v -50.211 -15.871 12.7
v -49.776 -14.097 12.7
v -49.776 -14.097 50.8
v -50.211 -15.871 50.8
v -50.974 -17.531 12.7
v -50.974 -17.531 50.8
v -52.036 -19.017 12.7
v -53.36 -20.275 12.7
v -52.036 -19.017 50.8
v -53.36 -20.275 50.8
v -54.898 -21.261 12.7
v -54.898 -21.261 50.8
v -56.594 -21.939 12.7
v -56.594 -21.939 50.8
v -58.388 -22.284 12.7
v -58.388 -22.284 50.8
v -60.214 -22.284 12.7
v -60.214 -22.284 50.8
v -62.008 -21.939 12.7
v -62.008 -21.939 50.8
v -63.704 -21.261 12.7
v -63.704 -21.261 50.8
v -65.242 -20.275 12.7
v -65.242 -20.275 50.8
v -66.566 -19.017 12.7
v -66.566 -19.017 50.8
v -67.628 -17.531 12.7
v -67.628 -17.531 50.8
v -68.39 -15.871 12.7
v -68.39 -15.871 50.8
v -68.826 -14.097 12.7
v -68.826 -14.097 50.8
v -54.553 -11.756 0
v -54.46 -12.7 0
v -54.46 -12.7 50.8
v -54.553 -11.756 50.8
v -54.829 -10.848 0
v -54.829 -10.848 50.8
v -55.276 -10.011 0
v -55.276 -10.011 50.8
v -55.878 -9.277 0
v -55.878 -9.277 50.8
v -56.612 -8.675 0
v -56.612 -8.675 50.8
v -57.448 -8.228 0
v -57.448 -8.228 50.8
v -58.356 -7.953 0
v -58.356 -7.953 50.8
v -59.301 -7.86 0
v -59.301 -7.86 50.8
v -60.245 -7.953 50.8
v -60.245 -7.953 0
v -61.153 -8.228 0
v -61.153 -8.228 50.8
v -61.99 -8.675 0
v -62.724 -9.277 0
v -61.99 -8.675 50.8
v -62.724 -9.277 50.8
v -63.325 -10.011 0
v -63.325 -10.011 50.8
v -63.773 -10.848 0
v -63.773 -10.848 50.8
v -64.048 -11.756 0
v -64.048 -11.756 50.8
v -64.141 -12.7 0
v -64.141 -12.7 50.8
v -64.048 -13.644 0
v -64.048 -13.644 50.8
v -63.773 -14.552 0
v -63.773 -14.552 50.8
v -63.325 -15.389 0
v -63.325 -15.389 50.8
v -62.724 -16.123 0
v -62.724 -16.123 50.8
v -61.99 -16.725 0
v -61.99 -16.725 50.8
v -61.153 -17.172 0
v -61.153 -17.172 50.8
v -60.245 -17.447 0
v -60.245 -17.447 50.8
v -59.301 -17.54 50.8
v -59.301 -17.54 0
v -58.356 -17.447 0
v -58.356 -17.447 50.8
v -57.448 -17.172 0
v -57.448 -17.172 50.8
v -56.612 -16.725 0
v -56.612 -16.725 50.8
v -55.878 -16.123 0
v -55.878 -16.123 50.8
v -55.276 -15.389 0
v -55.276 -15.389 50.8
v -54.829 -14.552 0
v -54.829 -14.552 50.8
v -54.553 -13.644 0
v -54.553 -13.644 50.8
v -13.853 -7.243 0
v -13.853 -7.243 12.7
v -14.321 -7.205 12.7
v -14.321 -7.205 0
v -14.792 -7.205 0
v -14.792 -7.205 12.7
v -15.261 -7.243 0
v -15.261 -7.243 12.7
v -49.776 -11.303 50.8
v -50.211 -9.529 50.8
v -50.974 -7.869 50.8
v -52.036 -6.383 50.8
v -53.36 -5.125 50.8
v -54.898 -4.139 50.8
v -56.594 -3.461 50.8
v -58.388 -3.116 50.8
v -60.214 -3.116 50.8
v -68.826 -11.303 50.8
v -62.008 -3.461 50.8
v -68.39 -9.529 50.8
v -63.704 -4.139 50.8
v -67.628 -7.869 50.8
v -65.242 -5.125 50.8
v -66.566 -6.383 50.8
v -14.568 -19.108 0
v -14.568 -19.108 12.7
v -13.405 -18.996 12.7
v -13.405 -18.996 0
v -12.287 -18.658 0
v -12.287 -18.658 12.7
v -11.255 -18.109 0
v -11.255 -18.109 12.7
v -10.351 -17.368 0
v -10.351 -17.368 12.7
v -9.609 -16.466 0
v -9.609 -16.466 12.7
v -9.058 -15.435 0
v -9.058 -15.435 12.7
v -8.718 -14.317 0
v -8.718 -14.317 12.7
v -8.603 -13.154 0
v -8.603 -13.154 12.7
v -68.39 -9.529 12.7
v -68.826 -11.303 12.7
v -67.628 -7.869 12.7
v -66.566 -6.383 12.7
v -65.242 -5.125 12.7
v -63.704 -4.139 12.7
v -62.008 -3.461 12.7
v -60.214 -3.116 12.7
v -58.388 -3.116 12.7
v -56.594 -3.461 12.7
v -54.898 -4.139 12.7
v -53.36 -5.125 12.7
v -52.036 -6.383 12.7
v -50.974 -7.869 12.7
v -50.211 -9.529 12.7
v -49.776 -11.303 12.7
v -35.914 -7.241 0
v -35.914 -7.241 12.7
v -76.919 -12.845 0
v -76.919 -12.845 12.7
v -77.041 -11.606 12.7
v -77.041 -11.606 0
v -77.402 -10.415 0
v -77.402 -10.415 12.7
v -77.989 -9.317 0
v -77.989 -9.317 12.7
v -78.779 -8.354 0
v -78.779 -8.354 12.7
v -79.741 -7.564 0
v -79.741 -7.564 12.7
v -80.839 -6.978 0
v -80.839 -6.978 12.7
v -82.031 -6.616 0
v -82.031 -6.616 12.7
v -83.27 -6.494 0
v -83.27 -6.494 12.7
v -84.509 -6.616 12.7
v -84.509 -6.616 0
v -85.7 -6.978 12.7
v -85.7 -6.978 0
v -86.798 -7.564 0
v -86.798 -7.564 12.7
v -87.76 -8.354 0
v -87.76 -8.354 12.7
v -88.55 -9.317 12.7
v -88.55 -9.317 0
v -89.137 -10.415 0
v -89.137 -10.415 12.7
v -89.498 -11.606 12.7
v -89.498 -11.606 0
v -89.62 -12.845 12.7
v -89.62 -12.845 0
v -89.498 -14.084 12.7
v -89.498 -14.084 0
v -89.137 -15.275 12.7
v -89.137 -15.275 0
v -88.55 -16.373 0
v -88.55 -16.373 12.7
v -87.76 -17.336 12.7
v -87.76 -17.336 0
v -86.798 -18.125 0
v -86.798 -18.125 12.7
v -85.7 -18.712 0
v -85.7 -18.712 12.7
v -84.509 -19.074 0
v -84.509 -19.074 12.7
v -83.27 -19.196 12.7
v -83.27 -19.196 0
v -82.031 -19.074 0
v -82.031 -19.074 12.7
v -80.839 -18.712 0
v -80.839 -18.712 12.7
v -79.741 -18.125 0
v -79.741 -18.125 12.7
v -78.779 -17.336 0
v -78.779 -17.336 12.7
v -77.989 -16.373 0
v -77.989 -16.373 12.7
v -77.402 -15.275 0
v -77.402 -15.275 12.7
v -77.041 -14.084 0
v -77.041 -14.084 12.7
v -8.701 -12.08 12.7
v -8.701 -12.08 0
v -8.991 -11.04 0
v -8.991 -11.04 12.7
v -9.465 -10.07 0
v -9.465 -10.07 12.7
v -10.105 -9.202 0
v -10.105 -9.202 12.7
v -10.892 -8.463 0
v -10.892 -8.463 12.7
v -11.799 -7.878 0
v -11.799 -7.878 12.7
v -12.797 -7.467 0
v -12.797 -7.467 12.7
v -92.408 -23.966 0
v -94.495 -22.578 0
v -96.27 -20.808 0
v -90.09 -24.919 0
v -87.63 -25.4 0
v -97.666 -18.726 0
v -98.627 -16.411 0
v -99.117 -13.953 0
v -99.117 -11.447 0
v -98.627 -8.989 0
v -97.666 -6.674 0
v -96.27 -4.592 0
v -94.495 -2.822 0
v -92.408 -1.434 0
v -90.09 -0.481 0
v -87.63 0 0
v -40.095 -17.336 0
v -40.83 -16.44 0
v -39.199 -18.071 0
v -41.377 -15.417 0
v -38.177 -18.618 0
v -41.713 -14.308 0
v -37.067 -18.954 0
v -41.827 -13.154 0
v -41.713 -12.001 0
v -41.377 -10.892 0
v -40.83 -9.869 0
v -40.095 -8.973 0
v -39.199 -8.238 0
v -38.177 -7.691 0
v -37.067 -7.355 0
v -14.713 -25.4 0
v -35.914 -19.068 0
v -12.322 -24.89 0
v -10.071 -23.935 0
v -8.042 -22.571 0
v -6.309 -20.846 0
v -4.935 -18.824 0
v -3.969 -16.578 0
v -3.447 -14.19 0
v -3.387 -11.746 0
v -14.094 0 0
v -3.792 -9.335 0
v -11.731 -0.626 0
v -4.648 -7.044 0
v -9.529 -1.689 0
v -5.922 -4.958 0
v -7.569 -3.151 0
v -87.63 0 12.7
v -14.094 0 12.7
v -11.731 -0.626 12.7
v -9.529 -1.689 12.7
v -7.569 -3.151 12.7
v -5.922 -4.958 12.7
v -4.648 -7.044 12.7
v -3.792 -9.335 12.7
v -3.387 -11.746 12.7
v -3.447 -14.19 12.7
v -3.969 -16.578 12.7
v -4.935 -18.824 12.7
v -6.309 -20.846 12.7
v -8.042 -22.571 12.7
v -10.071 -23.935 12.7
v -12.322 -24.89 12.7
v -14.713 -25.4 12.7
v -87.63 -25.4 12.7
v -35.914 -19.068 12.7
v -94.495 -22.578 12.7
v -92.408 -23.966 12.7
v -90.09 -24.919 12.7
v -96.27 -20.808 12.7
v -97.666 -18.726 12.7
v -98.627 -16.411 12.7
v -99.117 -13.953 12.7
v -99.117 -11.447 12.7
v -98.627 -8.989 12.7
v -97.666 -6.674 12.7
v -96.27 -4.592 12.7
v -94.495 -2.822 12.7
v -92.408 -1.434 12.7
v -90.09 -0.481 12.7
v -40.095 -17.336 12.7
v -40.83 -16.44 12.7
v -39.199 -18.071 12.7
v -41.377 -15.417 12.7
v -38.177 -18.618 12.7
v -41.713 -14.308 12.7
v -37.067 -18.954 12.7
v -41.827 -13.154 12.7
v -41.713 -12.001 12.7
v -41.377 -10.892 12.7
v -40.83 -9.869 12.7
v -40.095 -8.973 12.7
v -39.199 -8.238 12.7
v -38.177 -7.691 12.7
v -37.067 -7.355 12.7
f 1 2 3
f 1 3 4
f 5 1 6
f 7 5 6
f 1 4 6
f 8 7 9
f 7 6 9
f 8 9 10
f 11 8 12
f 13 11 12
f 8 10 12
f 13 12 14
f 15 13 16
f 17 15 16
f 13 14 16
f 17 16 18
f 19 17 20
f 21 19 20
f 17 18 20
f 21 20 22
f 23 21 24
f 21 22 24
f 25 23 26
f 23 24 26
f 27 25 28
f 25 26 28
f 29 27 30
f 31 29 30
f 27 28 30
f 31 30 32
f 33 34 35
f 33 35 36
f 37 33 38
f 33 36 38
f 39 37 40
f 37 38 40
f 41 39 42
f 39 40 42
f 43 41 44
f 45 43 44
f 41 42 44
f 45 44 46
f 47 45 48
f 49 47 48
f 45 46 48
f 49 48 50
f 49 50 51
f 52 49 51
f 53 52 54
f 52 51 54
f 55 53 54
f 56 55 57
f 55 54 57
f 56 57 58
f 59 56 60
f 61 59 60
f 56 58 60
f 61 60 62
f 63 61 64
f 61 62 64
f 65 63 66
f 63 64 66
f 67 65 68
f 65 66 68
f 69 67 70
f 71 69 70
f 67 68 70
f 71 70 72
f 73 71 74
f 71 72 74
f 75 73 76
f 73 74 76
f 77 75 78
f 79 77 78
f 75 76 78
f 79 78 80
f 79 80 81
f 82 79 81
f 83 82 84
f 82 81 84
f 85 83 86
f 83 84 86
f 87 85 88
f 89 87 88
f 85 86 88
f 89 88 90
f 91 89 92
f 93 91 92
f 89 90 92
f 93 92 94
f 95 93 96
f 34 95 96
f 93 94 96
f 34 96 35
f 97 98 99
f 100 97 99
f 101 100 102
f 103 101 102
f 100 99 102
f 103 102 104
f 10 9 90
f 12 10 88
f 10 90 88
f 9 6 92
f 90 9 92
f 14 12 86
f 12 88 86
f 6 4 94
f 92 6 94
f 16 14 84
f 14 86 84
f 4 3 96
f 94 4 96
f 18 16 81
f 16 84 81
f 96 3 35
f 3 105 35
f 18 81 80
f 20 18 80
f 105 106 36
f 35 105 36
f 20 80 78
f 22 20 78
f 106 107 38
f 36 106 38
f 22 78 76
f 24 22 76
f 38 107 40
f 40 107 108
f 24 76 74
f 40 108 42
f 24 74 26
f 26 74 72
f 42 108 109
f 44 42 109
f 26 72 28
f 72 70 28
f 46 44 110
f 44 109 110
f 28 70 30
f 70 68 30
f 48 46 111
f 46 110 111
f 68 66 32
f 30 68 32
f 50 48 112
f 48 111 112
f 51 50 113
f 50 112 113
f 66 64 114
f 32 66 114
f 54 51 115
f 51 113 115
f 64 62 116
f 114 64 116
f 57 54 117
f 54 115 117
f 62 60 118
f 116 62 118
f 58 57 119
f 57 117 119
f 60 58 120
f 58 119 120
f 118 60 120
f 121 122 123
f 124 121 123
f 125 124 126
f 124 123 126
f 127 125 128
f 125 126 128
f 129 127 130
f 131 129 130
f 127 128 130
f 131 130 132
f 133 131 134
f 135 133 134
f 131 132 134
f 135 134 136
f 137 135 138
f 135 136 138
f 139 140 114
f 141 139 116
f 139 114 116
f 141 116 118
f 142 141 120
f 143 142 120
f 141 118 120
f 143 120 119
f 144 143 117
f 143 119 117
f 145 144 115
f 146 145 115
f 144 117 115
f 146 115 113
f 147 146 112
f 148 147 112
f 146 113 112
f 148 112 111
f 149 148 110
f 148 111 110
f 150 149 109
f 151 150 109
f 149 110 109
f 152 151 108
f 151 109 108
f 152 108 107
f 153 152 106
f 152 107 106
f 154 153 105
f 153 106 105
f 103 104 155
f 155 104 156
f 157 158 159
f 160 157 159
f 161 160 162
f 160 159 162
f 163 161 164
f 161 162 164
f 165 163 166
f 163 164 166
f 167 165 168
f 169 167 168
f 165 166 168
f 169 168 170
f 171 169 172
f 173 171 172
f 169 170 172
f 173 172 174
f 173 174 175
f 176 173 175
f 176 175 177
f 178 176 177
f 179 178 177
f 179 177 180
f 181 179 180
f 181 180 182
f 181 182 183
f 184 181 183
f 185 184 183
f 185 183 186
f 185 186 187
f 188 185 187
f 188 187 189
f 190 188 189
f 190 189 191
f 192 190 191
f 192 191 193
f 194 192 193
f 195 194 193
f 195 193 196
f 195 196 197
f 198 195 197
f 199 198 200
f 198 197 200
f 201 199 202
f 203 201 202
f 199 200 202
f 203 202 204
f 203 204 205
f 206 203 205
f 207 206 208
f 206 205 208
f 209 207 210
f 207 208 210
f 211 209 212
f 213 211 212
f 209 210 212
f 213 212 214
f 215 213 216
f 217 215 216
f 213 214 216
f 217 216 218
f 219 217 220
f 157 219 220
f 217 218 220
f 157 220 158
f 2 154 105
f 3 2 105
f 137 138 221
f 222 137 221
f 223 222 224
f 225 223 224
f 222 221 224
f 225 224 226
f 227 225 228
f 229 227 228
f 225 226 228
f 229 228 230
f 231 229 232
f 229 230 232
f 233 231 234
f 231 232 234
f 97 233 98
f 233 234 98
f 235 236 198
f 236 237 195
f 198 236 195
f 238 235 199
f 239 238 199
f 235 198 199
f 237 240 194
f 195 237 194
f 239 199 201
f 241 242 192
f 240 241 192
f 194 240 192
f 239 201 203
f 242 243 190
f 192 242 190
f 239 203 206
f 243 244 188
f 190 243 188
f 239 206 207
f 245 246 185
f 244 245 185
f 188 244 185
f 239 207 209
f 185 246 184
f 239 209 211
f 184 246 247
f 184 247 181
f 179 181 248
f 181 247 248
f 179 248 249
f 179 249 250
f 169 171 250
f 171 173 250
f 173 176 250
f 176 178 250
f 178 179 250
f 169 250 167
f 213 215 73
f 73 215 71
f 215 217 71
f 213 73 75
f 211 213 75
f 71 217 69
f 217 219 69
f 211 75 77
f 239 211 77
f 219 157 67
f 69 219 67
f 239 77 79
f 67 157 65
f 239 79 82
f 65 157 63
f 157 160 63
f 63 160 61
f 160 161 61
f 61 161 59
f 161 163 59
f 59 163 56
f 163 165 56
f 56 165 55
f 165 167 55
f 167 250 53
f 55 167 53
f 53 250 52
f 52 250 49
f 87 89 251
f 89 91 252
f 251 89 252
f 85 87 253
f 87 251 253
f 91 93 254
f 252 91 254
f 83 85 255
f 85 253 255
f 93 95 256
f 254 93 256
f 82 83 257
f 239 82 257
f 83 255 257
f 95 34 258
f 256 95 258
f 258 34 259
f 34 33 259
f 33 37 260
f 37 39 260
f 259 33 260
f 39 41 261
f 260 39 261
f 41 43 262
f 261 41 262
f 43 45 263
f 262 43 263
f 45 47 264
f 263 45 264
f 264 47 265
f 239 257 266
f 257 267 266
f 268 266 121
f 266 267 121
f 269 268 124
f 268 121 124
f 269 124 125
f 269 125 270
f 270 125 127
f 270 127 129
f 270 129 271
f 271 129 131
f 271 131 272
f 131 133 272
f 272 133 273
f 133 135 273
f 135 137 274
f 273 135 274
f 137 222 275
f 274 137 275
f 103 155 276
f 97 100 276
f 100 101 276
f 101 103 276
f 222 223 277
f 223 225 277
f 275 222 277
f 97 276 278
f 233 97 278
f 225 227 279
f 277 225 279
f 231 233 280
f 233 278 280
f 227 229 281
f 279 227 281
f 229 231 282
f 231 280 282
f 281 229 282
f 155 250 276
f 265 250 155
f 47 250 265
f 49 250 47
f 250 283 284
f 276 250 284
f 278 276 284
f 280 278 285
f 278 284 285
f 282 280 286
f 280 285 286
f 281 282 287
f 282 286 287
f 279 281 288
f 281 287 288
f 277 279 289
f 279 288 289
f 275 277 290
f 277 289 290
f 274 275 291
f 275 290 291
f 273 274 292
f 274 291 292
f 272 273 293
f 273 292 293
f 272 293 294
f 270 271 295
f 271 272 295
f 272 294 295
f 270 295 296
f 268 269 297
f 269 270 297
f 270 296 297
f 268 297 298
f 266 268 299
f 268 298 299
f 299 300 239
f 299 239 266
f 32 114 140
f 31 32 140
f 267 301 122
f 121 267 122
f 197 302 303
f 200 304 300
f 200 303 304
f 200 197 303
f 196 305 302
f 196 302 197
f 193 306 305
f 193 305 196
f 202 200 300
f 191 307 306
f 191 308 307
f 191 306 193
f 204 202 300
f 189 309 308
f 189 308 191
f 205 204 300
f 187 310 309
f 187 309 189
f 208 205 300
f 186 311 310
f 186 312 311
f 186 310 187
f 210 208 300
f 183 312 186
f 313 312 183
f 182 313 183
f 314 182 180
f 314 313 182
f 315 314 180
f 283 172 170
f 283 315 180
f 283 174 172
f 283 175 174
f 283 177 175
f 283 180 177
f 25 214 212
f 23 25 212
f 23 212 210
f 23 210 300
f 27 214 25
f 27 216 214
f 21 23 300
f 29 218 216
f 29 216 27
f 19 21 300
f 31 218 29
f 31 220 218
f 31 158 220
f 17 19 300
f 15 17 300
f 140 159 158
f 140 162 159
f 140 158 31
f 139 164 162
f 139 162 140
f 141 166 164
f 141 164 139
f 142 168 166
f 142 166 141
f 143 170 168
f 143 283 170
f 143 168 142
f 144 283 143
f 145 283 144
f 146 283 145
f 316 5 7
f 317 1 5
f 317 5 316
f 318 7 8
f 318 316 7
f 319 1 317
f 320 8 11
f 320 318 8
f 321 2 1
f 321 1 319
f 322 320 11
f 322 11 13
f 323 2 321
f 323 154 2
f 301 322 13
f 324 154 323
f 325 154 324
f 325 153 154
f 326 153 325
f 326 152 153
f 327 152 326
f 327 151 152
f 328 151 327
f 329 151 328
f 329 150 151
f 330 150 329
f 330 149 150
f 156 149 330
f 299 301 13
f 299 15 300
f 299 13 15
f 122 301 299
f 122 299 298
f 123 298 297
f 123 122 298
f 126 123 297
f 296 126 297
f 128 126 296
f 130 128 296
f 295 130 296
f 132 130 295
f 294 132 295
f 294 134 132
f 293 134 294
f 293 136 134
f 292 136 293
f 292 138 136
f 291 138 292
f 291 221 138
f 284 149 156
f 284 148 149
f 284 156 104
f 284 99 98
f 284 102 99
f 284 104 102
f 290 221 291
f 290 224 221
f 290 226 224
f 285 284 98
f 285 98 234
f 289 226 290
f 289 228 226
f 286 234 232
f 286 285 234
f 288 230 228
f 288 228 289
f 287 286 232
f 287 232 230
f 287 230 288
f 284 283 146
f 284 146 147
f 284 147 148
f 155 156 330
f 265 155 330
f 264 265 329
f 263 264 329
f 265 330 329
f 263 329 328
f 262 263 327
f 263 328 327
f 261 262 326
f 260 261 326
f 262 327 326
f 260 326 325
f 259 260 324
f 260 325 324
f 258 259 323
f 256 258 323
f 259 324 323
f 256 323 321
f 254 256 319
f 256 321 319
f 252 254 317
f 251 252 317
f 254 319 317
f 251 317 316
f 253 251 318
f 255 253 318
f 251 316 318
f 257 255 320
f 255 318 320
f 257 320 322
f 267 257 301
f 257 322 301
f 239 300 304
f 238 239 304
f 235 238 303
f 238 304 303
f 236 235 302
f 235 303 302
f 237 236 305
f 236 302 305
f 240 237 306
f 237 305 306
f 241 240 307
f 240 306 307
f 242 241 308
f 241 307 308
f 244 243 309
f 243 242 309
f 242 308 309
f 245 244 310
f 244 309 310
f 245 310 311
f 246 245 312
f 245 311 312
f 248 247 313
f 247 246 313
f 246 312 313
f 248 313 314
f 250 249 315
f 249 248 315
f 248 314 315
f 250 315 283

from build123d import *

# Parameters (mm, degrees)
F1_DEPTH  = 25.4
F2_R      = 4.8404450777
F3_DEPTH  = 50.8
F5_DEPTH  = 25.4
F6_DEPTH  = 25.4
F7_R      = 6.3507472709
F8_DEPTH  = 25.4
F10_DEPTH = 38.1
F11_DEPTH = 25.4
F12_DEPTH = 25.4


# Not quite as in the source:
# - a feature names something its author has since deleted; it is built from what else it names


with BuildPart() as f1:
    # F0 (on Front) → F1 (new body)
    with BuildSketch(Plane.XZ):
        Polygon((-101.6, 0), (0, 0), (0, 12.7), (-49.7758105871, 12.7), (-49.7758105871, 50.8), (-68.8258105871, 50.8), (-68.8258105871, 12.7), (-101.6, 12.7), align=None)
    extrude(amount=F1_DEPTH)

    # F2 (on face) → F3 (cut)
    with BuildSketch(Plane.XY.offset(50.8)):
        with Locations((-59.3008105871, -12.7)):
            Circle(F2_R)
    extrude(amount=-F3_DEPTH, mode=Mode.SUBTRACT)

    # F4 (on face) → F5 (cut)
    with BuildSketch(Plane.XY.offset(12.7)):
        with BuildLine():
            ThreePointArc((-35.9137319028, -19.0677542063), (-31.7323936508, -17.3357871934), (-30.0004266379, -13.1544489413))
            ThreePointArc((-30.0004266379, -13.1544489413), (-31.7323936508, -8.9731106893), (-35.9137319028, -7.2411436764))
            ThreePointArc((-35.9137319028, -7.2411436764), (-41.8270371678, -13.1544489413), (-35.9137319028, -19.0677542063))
        make_face()
        with BuildLine():
            ThreePointArc((-35.9137319028, -7.2411436764), (-31.7323936508, -8.9731106893), (-30.0004266379, -13.1544489413))
            ThreePointArc((-30.0004266379, -13.1544489413), (-31.7323936508, -17.3357871934), (-35.9137319028, -19.0677542063))
            Line((-35.9137319028, -19.0677542063), (-14.5683543234, -19.1081041901))
            ThreePointArc((-14.5683543234, -19.1081041901), (-20.5006521622, -13.5013264467), (-15.2608531919, -7.2425229617))
            Line((-15.2608531919, -7.2425229617), (-35.9137319028, -7.2411436632))
        make_face()
        with BuildLine():
            Line((-13.852556963, -7.2426170145), (-15.2608531919, -7.2425229617))
            ThreePointArc((-15.2608531919, -7.2425229617), (-20.5006521622, -13.5013264467), (-14.5683543234, -19.1081041901))
            ThreePointArc((-14.5683543234, -19.1081041901), (-10.3512033015, -17.3683036228), (-8.603434015, -13.1544489413))
            ThreePointArc((-8.603434015, -13.1544489413), (-10.1050918857, -9.2015054667), (-13.852556963, -7.2426170145))
        make_face()
        with BuildLine():
            ThreePointArc((-13.852556963, -7.2426170145), (-14.5567022867, -7.2007830685), (-15.2608531919, -7.2425229617))
            Line((-15.2608531919, -7.2425229617), (-13.852556963, -7.2426170145))
        make_face()
        with BuildLine():
            ThreePointArc((-14.0938774664, 0), (-3.3585658021, -12.9691778388), (-14.712910818, -25.4))
            Line((-14.712910818, -25.4), (0, -25.4))
            Line((0, -25.4), (0, 0))
            Line((0, 0), (-14.0938774664, 0))
        make_face()
    extrude(amount=-F5_DEPTH, mode=Mode.SUBTRACT)

    # F4 (on face) → F6 (cut)
    with BuildSketch(Plane.XY.offset(12.7)):
        with BuildLine():
            ThreePointArc((-35.9137319028, -19.0677542063), (-31.7323936508, -17.3357871934), (-30.0004266379, -13.1544489413))
            ThreePointArc((-30.0004266379, -13.1544489413), (-31.7323936508, -8.9731106893), (-35.9137319028, -7.2411436764))
            ThreePointArc((-35.9137319028, -7.2411436764), (-41.8270371678, -13.1544489413), (-35.9137319028, -19.0677542063))
        make_face()
        with BuildLine():
            ThreePointArc((-35.9137319028, -7.2411436764), (-31.7323936508, -8.9731106893), (-30.0004266379, -13.1544489413))
            ThreePointArc((-30.0004266379, -13.1544489413), (-31.7323936508, -17.3357871934), (-35.9137319028, -19.0677542063))
            Line((-35.9137319028, -19.0677542063), (-14.5683543234, -19.1081041901))
            ThreePointArc((-14.5683543234, -19.1081041901), (-20.5006521622, -13.5013264467), (-15.2608531919, -7.2425229617))
            Line((-15.2608531919, -7.2425229617), (-35.9137319028, -7.2411436632))
        make_face()
        with BuildLine():
            Line((-13.852556963, -7.2426170145), (-15.2608531919, -7.2425229617))
            ThreePointArc((-15.2608531919, -7.2425229617), (-20.5006521622, -13.5013264467), (-14.5683543234, -19.1081041901))
            ThreePointArc((-14.5683543234, -19.1081041901), (-10.3512033015, -17.3683036228), (-8.603434015, -13.1544489413))
            ThreePointArc((-8.603434015, -13.1544489413), (-10.1050918857, -9.2015054667), (-13.852556963, -7.2426170145))
        make_face()
        with BuildLine():
            ThreePointArc((-13.852556963, -7.2426170145), (-14.5567022867, -7.2007830685), (-15.2608531919, -7.2425229617))
            Line((-15.2608531919, -7.2425229617), (-13.852556963, -7.2426170145))
        make_face()
    extrude(amount=-F6_DEPTH, mode=Mode.SUBTRACT)

    # F7 (on face) → F8 (cut)
    with BuildSketch(Plane.XY.offset(12.7)):
        with Locations((-83.2697451115, -12.8449322656)):
            Circle(F7_R)
        with BuildLine():
            ThreePointArc((-87.6296867998, -25.4), (-99.1786550293, -12.7), (-87.6296867998, 0))
            Line((-87.6296867998, 0), (-101.6, 0))
            Line((-101.6, 0), (-101.6, -25.4))
            Line((-101.6, -25.4), (-87.6296867998, -25.4))
        make_face()
    extrude(amount=-F8_DEPTH, mode=Mode.SUBTRACT)

    # F9 (on face) → F10 (cut)
    with BuildSketch(Plane.XY.offset(50.8)):
        with BuildLine():
            ThreePointArc((-68.8258105871, -11.3028298429), (-59.3008105871, -3.0730737279), (-49.7758105871, -11.3028298429))
            Line((-49.7758105871, -11.3028298429), (-49.7758105871, 0))
            Line((-49.7758105871, 0), (-68.8258105871, 0))
            Line((-68.8258105871, 0), (-68.8258105871, -11.3028298429))
        make_face()
        with BuildLine():
            Line((-49.7758105871, -25.4), (-49.7758105871, -14.0971701571))
            ThreePointArc((-49.7758105871, -14.0971701571), (-59.3008105871, -22.3269262721), (-68.8258105871, -14.0971701571))
            Line((-68.8258105871, -14.0971701571), (-68.8258105871, -25.4))
            Line((-68.8258105871, -25.4), (-49.7758105871, -25.4))
        make_face()
    extrude(amount=-F10_DEPTH, mode=Mode.SUBTRACT)


with BuildPart() as f11:
    # F7 (on face) → F11 (new body)
    with BuildSketch(Plane.XY.offset(12.7)):
        with Locations((-83.2697451115, -12.8449322656)):
            Circle(F7_R)
    extrude(amount=F11_DEPTH)

    # F12 (cut): a face of the model
    f12_faces = [f11.faces().sort_by_distance(p)[0] for p in [
        (-83.2697451115, -12.8449322656, 38.1),
    ]]
    extrude(f12_faces, amount=-F12_DEPTH, mode=Mode.SUBTRACT)


solid = f1.part
